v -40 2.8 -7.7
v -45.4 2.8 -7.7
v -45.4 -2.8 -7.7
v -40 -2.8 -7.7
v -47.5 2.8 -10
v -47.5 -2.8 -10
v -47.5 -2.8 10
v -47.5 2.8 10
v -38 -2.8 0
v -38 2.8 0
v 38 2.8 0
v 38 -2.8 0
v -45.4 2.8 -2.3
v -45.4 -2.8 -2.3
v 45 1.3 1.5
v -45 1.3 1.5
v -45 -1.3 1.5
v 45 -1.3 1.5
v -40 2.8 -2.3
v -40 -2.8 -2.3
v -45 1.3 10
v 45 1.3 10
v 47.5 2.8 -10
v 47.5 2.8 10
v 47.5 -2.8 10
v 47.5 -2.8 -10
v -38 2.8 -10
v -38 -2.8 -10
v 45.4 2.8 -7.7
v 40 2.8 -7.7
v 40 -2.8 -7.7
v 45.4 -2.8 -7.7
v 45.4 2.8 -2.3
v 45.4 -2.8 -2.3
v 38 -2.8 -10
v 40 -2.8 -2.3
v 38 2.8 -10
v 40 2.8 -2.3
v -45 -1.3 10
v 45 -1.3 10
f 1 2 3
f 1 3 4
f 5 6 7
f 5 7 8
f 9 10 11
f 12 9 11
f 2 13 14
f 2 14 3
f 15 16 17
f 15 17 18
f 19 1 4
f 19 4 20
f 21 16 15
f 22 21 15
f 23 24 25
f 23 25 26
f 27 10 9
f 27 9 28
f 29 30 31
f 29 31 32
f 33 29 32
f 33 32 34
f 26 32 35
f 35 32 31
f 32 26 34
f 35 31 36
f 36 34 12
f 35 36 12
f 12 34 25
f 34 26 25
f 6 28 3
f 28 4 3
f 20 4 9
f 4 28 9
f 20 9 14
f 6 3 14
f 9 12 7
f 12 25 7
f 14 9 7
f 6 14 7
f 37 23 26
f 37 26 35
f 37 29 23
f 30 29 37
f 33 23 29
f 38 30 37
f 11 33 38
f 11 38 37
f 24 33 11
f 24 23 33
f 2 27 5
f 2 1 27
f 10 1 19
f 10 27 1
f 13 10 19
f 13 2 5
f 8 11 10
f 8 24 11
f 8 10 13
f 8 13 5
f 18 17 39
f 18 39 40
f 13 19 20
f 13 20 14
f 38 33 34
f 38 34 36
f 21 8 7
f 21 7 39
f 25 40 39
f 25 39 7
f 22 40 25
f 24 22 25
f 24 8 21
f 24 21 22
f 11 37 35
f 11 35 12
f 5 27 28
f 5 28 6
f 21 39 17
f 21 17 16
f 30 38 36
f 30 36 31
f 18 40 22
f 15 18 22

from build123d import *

# Parameters (mm, degrees)
F0_W     = 95
F0_H     = 5.6
F0_W_2   = 90
F0_H_2   = 2.6
F1_DEPTH = 10
F2_DEPTH = 1.5
F4_DEPTH = 5.6


with BuildPart() as f1:
    # F0 (on Top) → F1 (new body)
    with BuildSketch(Plane.XY):
        Rectangle(F0_W, F0_H)
        Rectangle(F0_W_2, F0_H_2, mode=Mode.SUBTRACT)
    extrude(amount=F1_DEPTH)

    # F0 (on Top) → F2 (join)
    with BuildSketch(Plane.XY):
        Rectangle(F0_W_2, F0_H_2)
    extrude(amount=F2_DEPTH)

    # F3 (on face) → F4 (join)
    with BuildSketch(Plane(origin=(0, 2.8, 0), x_dir=(-1, 0, 0), z_dir=(0, 1, 0))):
        Polygon((-40, -2.3), (-40, 0), (-47.5, 0), (-47.5, -10), (-40, -10), (-40, -7.7), (-45.4, -7.7), (-45.4, -2.3), align=None)
        Polygon((-38, -10), (-38, 0), (-40, 0), (-40, -2.3), (-40, -7.7), (-40, -10), align=None)
        Polygon((40, -2.3), (40, 0), (38, 0), (38, -10), (40, -10), (40, -7.7), align=None)
        Polygon((47.5, 0), (40, 0), (40, -2.3), (45.4, -2.3), (45.4, -7.7), (40, -7.7), (40, -10), (47.5, -10), align=None)
    extrude(amount=-F4_DEPTH)


solid = f1.part
